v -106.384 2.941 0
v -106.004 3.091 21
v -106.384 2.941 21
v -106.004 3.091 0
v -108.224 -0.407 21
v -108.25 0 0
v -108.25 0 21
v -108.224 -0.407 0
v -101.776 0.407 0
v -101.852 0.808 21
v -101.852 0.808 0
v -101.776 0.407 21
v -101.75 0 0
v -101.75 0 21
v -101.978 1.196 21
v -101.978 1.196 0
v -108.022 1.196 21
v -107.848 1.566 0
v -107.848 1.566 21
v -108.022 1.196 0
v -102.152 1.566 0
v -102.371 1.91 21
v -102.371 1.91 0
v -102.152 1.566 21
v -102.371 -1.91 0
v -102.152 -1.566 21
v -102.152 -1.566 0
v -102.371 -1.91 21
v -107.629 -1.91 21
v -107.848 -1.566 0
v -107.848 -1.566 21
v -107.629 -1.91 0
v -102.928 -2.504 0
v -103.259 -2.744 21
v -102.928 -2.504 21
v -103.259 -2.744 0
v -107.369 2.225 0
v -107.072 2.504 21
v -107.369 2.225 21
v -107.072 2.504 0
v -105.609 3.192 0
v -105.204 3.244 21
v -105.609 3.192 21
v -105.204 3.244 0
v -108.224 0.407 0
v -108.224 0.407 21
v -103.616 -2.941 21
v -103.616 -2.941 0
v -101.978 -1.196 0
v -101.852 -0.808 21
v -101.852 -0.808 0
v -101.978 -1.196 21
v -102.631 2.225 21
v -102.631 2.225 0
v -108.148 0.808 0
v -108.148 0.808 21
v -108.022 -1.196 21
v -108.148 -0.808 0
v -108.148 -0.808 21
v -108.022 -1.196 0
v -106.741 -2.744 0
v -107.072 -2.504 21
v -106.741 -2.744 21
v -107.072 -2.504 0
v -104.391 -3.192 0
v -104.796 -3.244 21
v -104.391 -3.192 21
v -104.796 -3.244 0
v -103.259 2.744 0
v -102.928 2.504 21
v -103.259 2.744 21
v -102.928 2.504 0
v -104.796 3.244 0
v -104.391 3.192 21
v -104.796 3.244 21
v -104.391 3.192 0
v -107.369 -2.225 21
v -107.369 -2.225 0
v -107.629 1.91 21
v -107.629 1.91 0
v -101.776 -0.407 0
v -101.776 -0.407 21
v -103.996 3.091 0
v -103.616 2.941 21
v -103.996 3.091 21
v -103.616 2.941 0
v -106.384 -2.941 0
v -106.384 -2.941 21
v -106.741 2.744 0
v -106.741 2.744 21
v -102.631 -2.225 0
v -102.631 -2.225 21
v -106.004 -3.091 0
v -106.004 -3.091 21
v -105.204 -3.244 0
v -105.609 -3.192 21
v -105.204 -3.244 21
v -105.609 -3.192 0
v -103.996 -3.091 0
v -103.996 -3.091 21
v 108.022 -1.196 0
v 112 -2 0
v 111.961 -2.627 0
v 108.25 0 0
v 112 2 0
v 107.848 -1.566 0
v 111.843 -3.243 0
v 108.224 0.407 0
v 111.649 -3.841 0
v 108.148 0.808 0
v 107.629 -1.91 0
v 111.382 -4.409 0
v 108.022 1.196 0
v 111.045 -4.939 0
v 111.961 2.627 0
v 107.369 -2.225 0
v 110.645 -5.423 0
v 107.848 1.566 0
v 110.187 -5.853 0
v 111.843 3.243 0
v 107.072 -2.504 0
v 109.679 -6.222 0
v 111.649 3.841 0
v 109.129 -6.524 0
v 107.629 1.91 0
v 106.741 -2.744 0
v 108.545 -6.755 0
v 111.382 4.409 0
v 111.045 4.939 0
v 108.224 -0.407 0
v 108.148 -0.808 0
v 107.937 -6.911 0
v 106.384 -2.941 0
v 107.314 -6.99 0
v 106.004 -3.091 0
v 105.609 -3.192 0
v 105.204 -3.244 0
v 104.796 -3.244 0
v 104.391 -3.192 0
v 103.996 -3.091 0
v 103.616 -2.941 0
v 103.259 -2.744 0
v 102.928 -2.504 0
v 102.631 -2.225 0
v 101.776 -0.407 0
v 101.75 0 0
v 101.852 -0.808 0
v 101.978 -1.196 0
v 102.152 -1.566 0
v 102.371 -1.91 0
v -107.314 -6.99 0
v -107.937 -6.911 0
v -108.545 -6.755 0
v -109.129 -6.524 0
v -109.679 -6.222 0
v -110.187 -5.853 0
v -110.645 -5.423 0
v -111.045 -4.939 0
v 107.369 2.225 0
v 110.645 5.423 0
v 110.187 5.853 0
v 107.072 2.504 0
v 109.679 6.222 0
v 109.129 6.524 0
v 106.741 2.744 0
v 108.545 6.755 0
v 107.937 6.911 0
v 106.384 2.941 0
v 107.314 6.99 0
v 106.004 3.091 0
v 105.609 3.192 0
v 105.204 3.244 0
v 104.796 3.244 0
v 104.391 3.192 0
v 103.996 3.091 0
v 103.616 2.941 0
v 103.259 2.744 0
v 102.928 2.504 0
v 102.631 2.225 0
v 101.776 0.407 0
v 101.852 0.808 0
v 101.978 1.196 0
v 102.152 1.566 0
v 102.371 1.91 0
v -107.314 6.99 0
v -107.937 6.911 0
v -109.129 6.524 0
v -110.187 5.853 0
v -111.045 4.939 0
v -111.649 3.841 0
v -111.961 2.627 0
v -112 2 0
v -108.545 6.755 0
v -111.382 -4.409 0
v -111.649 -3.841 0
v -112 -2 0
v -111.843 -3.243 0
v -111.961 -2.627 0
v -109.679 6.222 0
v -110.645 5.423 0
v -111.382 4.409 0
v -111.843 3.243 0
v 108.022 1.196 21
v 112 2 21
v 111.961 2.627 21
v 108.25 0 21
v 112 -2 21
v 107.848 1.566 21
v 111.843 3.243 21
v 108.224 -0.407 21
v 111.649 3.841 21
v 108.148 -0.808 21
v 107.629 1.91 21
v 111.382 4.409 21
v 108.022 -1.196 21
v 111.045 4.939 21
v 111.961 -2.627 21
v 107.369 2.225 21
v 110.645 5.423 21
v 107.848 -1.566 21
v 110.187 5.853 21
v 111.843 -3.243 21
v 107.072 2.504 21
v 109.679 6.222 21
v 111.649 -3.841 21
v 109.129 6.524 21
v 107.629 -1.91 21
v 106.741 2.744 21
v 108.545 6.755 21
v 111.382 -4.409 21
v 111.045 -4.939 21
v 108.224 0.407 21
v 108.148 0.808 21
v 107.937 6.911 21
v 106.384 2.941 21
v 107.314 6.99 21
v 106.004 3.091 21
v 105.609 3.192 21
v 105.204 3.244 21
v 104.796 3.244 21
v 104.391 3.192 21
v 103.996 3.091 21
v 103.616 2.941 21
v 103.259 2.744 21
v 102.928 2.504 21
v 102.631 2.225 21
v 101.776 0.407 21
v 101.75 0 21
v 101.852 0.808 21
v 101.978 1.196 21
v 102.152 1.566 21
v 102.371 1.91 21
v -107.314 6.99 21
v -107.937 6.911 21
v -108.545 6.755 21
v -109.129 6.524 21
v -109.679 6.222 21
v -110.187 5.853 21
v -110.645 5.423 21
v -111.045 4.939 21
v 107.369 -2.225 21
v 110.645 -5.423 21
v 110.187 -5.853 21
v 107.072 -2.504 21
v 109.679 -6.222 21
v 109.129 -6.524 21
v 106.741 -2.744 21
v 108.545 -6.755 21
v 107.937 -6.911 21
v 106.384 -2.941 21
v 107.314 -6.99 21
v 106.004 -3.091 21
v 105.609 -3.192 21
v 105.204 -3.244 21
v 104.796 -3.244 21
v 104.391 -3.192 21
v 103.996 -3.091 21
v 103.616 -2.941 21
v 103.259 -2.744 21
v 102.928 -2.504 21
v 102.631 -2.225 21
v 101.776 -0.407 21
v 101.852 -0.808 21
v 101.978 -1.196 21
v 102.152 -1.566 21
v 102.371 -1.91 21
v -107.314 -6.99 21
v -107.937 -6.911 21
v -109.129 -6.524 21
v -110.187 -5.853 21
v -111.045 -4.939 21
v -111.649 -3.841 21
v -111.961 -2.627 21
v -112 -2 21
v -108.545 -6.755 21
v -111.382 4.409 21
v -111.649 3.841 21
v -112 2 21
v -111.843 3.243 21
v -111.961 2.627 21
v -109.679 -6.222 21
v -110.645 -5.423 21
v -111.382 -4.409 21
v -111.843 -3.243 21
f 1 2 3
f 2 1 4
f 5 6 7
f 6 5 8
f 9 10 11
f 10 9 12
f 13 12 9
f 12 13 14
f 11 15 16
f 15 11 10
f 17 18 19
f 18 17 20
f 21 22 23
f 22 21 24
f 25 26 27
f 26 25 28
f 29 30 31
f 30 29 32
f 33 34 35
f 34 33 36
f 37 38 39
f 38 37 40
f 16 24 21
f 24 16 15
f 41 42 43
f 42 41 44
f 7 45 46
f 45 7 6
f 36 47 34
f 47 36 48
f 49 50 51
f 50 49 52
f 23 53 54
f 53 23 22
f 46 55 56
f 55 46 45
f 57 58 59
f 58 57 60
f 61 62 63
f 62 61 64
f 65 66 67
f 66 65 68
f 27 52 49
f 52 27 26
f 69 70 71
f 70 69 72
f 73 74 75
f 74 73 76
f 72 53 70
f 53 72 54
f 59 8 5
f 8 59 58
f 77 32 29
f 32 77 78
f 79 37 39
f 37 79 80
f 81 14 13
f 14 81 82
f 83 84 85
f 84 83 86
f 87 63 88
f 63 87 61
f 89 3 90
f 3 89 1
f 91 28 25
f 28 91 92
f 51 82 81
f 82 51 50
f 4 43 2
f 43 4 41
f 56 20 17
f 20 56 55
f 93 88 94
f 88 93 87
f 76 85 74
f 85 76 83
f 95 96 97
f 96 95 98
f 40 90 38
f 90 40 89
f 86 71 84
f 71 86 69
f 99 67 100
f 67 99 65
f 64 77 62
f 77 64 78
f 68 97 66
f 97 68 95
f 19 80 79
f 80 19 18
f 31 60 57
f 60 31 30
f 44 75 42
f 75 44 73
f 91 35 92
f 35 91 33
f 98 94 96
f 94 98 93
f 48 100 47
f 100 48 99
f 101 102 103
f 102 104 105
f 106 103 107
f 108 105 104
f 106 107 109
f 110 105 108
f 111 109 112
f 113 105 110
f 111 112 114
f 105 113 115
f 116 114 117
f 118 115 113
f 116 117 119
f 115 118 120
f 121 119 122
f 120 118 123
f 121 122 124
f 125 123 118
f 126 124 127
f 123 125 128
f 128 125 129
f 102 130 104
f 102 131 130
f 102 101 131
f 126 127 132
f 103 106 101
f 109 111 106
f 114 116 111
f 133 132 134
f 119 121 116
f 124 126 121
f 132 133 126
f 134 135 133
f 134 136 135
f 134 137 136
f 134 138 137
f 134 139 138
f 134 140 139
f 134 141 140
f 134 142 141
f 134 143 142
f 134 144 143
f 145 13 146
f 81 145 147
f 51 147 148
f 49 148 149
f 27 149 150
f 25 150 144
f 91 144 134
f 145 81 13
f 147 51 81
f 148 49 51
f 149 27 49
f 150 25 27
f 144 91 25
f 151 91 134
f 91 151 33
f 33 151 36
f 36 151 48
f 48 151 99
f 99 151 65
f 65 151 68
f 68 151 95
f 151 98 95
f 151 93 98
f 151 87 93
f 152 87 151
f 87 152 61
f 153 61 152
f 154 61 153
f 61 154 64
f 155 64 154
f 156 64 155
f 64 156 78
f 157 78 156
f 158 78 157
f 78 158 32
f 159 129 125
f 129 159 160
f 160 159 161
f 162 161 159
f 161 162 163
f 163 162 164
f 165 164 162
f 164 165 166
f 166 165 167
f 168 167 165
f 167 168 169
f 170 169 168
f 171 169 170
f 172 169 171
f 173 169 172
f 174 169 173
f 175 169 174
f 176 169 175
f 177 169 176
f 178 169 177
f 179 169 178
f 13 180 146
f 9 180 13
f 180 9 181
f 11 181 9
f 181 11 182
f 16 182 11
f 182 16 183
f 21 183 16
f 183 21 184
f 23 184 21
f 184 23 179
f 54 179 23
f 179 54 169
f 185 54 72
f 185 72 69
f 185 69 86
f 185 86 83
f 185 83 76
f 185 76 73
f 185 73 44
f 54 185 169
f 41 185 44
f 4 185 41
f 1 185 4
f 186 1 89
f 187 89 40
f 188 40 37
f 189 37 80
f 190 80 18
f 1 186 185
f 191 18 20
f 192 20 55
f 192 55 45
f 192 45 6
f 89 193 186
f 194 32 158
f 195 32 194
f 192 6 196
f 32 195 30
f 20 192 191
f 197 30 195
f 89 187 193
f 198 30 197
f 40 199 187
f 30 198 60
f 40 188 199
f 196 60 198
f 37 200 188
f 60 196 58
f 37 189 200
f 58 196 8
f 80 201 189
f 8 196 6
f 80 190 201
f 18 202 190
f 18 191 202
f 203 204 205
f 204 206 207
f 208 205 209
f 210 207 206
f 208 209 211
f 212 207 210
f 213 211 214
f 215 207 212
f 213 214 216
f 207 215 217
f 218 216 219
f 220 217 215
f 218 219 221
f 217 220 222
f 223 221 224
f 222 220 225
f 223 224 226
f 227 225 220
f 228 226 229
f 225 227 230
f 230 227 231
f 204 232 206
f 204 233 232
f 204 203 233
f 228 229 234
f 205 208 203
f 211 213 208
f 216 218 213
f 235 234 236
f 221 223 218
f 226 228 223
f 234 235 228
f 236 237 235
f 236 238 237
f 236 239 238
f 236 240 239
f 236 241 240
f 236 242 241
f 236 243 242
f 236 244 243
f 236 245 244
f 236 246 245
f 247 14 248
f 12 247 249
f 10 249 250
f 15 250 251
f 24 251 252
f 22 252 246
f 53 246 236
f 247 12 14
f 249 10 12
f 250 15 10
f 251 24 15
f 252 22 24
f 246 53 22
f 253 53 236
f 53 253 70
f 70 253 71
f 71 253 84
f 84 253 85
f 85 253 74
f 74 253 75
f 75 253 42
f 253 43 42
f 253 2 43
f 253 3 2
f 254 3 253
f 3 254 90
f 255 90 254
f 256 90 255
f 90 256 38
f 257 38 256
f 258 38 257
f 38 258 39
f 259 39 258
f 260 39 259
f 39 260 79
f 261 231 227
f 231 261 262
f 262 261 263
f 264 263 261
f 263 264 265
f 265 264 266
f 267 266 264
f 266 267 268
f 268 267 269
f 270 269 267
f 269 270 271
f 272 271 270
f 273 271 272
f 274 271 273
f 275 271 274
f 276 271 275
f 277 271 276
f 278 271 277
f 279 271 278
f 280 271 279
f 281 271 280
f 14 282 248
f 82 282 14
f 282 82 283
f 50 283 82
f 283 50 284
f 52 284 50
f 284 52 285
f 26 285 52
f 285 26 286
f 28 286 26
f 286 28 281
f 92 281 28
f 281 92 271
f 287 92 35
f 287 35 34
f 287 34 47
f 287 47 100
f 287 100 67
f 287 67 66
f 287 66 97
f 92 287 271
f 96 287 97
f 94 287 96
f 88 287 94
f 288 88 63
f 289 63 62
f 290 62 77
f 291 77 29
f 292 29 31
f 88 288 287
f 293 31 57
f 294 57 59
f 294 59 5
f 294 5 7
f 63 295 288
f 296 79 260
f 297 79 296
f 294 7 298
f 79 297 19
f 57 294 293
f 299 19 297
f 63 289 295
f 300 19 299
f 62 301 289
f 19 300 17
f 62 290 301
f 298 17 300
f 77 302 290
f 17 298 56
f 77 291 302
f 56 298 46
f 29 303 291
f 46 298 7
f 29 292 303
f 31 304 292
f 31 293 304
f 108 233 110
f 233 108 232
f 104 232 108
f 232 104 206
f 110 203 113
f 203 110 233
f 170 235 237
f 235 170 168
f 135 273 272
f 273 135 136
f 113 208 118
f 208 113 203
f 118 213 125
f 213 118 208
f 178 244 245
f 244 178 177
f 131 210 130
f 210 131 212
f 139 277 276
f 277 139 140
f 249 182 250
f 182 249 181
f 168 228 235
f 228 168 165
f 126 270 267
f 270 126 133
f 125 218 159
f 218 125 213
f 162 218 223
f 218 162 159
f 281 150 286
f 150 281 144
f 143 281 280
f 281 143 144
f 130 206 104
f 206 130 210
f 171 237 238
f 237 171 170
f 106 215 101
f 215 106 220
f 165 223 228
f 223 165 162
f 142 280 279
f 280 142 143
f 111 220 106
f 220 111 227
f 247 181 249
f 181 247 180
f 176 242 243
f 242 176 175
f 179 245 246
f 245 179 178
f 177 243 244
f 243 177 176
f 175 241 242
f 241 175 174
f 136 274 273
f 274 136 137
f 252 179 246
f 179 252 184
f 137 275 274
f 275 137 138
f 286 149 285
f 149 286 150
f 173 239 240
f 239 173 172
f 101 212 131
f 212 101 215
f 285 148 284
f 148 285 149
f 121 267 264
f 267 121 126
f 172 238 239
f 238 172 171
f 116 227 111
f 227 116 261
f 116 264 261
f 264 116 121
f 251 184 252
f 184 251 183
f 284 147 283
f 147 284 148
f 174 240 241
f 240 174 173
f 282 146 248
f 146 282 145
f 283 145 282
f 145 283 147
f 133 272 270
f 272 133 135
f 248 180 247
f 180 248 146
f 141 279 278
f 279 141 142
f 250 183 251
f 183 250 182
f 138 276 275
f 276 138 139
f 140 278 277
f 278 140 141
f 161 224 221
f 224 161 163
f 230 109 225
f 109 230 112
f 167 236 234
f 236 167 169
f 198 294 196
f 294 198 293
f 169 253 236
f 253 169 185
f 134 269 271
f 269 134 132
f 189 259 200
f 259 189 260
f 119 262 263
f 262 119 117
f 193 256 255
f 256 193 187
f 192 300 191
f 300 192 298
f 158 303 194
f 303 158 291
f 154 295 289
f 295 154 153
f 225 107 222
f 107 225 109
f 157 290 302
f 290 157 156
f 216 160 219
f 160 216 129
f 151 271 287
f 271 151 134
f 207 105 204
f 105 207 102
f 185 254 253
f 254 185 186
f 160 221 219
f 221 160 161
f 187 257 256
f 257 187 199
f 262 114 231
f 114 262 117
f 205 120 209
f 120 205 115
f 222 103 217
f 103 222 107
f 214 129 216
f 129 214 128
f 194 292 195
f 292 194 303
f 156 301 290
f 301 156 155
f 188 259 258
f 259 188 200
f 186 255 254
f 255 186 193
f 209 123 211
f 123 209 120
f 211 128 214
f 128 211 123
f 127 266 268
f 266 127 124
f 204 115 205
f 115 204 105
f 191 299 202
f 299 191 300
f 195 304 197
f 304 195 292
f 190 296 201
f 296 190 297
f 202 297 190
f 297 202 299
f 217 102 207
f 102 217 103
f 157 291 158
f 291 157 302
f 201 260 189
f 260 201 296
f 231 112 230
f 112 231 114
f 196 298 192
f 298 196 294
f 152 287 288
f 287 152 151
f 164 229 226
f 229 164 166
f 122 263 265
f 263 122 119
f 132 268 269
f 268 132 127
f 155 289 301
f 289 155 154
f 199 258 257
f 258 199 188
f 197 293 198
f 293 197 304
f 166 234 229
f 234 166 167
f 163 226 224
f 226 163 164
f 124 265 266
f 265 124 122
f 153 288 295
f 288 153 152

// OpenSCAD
$fn = 50;


difference() {
	union() {
		hull() {
			translate(v = [-107.0000000000, 2.0000000000, 0]) {
				cylinder(h = 21, r = 5);
			}
			translate(v = [107.0000000000, 2.0000000000, 0]) {
				cylinder(h = 21, r = 5);
			}
			translate(v = [-107.0000000000, -2.0000000000, 0]) {
				cylinder(h = 21, r = 5);
			}
			translate(v = [107.0000000000, -2.0000000000, 0]) {
				cylinder(h = 21, r = 5);
			}
		}
	}
	union() {
		translate(v = [-105.0000000000, 0.0000000000, 0]) {
			cylinder(h = 21, r = 3.2500000000);
		}
		translate(v = [105.0000000000, 0.0000000000, 0]) {
			cylinder(h = 21, r = 3.2500000000);
		}
		translate(v = [-105.0000000000, 0.0000000000, 0]) {
			cylinder(h = 21, r = 1.8000000000);
		}
		translate(v = [105.0000000000, 0.0000000000, 0]) {
			cylinder(h = 21, r = 1.8000000000);
		}
		translate(v = [-105.0000000000, 0.0000000000, 0]) {
			cylinder(h = 21, r = 1.8000000000);
		}
		translate(v = [105.0000000000, 0.0000000000, 0]) {
			cylinder(h = 21, r = 1.8000000000);
		}
		translate(v = [-105.0000000000, 0.0000000000, 0]) {
			cylinder(h = 21, r = 1.8000000000);
		}
		translate(v = [105.0000000000, 0.0000000000, 0]) {
			cylinder(h = 21, r = 1.8000000000);
		}
	}
}
